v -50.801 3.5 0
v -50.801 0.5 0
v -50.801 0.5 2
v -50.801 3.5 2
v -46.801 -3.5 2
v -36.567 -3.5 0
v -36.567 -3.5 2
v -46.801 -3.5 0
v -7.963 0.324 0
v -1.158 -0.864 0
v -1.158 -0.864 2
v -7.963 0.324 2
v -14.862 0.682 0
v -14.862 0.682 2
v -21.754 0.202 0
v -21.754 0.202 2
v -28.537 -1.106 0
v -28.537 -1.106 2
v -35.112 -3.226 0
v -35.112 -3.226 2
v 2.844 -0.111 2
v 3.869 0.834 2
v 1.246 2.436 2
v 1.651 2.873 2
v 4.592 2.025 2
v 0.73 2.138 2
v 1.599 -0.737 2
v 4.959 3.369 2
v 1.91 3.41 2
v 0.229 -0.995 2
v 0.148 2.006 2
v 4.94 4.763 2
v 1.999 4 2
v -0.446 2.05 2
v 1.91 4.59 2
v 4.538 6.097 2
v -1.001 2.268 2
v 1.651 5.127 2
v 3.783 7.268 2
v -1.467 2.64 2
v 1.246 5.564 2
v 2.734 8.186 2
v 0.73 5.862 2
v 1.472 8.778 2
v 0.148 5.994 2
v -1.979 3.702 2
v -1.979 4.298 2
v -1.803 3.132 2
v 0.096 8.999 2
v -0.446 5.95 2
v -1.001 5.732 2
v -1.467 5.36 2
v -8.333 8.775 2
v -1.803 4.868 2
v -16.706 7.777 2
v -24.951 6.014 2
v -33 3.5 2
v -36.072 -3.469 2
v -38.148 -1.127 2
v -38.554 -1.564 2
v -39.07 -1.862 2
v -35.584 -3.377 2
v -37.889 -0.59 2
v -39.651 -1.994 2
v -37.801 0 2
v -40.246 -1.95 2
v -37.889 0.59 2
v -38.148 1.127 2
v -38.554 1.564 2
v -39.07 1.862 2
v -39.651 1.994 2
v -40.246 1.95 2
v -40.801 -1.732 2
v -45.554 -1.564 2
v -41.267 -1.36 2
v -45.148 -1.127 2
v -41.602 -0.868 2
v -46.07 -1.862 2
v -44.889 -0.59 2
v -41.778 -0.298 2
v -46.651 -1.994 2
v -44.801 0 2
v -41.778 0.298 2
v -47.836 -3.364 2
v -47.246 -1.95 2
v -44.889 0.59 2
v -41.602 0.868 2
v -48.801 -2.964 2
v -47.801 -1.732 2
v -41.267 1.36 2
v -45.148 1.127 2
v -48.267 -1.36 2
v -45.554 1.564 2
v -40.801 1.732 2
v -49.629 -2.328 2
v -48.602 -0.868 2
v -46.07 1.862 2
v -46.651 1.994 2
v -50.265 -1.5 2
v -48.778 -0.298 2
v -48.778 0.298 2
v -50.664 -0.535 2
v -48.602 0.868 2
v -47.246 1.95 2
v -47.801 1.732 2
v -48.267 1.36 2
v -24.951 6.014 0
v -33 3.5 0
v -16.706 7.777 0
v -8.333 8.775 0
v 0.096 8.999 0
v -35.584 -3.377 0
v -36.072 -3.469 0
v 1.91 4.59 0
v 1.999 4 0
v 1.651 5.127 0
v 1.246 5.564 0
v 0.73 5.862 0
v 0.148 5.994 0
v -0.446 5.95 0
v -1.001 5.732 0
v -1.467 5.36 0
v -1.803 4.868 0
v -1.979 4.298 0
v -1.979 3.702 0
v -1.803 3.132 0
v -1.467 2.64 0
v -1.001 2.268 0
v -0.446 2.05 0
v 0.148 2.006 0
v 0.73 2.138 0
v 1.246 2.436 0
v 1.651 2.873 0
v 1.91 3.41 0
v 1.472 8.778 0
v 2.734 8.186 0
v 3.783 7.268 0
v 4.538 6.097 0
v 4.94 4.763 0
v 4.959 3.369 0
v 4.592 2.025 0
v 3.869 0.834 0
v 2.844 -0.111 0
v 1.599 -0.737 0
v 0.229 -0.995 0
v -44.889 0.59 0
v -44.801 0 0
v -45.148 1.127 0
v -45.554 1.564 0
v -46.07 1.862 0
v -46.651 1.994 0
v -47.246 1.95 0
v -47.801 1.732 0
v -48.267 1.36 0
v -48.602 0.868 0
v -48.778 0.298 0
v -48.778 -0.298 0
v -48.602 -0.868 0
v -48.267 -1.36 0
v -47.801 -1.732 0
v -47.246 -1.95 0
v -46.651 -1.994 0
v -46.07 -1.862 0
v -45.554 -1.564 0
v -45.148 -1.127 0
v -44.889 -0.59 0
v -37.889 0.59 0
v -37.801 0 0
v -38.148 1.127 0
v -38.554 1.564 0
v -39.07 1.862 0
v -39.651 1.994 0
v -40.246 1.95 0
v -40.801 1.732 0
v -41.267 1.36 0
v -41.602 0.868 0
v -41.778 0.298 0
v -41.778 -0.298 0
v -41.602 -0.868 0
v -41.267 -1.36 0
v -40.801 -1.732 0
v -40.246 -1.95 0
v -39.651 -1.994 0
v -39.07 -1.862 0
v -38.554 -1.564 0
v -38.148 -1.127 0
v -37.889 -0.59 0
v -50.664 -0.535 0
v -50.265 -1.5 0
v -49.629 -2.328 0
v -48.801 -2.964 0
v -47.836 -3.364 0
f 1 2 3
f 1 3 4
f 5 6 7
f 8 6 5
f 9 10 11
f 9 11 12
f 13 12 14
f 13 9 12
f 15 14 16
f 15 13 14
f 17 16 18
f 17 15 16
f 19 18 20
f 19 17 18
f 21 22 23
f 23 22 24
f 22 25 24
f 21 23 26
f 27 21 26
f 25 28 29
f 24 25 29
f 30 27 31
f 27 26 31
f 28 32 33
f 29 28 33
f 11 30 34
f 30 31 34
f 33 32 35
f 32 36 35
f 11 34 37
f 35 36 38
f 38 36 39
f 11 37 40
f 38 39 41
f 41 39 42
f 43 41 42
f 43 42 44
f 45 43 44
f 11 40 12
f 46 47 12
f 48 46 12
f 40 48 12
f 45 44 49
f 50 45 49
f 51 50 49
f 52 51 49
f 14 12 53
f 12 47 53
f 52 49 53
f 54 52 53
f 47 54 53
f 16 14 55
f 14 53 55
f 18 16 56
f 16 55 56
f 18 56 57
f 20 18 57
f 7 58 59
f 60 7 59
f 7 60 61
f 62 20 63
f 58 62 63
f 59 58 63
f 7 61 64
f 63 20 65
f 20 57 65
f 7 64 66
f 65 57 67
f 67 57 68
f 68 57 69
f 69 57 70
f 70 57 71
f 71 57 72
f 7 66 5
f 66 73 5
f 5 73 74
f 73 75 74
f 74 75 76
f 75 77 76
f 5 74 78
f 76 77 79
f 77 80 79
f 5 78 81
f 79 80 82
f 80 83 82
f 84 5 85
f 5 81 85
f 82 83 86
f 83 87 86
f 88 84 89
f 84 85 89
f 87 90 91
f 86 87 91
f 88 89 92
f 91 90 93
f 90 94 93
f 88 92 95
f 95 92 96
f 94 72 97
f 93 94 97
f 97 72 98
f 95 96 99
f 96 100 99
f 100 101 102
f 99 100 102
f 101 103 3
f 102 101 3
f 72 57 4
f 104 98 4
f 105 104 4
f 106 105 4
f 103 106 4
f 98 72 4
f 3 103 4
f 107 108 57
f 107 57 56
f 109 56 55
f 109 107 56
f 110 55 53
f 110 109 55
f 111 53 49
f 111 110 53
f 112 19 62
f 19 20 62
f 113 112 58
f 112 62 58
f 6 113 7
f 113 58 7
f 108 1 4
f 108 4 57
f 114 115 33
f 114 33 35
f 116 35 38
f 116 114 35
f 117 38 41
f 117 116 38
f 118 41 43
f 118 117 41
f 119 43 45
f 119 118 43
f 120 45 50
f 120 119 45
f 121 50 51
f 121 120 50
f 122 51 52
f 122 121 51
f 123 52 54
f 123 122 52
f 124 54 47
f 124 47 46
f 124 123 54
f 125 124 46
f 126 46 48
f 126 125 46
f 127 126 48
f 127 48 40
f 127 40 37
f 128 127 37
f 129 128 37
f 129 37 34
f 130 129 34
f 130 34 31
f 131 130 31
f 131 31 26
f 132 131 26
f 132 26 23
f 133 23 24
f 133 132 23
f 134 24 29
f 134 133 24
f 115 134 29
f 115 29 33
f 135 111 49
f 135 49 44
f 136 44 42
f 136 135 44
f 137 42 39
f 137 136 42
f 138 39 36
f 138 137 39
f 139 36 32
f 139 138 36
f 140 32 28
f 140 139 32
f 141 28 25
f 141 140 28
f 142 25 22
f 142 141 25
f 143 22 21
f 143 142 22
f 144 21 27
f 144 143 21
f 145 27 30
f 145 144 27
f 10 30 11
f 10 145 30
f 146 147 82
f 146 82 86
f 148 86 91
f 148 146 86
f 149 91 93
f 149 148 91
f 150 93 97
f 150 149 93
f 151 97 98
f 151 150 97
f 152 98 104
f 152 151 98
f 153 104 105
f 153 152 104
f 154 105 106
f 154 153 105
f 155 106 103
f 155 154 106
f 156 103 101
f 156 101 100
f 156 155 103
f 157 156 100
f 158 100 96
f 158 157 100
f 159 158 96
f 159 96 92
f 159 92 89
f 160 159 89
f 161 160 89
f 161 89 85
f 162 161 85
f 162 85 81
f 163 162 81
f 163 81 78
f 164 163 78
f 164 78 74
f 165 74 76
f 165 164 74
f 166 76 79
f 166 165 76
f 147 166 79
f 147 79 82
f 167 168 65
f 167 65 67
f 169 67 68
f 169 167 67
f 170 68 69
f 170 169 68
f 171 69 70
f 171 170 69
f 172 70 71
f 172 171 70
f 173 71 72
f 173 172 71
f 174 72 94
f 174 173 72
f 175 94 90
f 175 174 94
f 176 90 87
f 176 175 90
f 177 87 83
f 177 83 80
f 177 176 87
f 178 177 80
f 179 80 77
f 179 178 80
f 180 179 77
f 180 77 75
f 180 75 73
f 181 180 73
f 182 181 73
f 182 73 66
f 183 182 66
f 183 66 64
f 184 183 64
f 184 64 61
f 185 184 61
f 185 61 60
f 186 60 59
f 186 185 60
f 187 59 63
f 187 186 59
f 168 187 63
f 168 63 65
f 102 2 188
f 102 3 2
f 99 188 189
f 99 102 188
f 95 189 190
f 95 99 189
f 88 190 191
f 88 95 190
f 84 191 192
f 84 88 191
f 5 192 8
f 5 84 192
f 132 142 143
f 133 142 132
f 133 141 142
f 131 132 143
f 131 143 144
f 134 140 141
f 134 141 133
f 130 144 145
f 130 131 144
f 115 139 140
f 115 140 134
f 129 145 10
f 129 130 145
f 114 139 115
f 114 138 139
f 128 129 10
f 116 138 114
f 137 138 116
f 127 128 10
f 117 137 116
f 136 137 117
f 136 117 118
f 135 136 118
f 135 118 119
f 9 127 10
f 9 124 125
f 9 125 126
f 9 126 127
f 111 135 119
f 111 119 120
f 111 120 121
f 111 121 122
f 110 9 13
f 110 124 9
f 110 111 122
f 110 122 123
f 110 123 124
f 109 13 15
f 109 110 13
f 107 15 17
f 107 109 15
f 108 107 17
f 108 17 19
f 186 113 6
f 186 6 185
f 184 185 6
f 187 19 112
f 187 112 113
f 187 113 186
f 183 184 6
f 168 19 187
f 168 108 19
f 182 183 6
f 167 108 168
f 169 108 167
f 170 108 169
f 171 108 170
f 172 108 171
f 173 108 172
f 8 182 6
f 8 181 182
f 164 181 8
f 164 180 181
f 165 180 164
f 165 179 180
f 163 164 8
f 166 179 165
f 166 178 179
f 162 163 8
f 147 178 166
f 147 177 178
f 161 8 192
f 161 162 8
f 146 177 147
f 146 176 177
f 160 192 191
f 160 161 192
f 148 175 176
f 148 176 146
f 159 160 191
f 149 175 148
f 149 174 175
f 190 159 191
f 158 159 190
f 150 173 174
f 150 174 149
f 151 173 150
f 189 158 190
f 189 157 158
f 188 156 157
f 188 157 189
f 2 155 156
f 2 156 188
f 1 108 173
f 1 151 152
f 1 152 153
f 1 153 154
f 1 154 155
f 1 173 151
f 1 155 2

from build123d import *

# Parameters (mm, degrees)
SKETCH1_R           = 2
BOSS_EXTRUDE1_DEPTH = 2
FILLET1_R           = 4


with BuildPart() as part:
    # Sketch1 → Boss-Extrude1 (new body)
    with BuildSketch(Plane.XY):
        with BuildLine():
            Line((-36, 3.5), (-33, 3.5))
            ThreePointArc((-33, 3.5), (-16.705697773, 7.777052757), (0.096212134, 8.999054739))
            ThreePointArc((0.096212134, 8.999054739), (4.959049099, 3.369257867), (-1.158052235, -0.864282903))
            ThreePointArc((-1.158052235, -0.864282903), (-18.684835931, 0.519591906), (-35.800505276, -3.5))
            Line((-35.800505276, -3.5), (-50.800505276, -3.5))
            Line((-50.800505276, -3.5), (-50.800505276, 3.5))
            Line((-50.800505276, 3.5), (-36, 3.5))
        make_face()
        with Locations((-0.001007792, 4)):
            Circle(SKETCH1_R, mode=Mode.SUBTRACT)
        with Locations((-46.800505276, 0)):
            Circle(SKETCH1_R, mode=Mode.SUBTRACT)
        with Locations((-39.800505276, 0)):
            Circle(SKETCH1_R, mode=Mode.SUBTRACT)
    extrude(amount=BOSS_EXTRUDE1_DEPTH)

    # Fillet1
    fillet1_edges = [part.edges().sort_by_distance(p)[0] for p in [
        (-35.800505276, -3.5, 1),
        (-50.800505276, -3.5, 1),
    ]]
    fillet(fillet1_edges, radius=FILLET1_R)


solid = part.part
